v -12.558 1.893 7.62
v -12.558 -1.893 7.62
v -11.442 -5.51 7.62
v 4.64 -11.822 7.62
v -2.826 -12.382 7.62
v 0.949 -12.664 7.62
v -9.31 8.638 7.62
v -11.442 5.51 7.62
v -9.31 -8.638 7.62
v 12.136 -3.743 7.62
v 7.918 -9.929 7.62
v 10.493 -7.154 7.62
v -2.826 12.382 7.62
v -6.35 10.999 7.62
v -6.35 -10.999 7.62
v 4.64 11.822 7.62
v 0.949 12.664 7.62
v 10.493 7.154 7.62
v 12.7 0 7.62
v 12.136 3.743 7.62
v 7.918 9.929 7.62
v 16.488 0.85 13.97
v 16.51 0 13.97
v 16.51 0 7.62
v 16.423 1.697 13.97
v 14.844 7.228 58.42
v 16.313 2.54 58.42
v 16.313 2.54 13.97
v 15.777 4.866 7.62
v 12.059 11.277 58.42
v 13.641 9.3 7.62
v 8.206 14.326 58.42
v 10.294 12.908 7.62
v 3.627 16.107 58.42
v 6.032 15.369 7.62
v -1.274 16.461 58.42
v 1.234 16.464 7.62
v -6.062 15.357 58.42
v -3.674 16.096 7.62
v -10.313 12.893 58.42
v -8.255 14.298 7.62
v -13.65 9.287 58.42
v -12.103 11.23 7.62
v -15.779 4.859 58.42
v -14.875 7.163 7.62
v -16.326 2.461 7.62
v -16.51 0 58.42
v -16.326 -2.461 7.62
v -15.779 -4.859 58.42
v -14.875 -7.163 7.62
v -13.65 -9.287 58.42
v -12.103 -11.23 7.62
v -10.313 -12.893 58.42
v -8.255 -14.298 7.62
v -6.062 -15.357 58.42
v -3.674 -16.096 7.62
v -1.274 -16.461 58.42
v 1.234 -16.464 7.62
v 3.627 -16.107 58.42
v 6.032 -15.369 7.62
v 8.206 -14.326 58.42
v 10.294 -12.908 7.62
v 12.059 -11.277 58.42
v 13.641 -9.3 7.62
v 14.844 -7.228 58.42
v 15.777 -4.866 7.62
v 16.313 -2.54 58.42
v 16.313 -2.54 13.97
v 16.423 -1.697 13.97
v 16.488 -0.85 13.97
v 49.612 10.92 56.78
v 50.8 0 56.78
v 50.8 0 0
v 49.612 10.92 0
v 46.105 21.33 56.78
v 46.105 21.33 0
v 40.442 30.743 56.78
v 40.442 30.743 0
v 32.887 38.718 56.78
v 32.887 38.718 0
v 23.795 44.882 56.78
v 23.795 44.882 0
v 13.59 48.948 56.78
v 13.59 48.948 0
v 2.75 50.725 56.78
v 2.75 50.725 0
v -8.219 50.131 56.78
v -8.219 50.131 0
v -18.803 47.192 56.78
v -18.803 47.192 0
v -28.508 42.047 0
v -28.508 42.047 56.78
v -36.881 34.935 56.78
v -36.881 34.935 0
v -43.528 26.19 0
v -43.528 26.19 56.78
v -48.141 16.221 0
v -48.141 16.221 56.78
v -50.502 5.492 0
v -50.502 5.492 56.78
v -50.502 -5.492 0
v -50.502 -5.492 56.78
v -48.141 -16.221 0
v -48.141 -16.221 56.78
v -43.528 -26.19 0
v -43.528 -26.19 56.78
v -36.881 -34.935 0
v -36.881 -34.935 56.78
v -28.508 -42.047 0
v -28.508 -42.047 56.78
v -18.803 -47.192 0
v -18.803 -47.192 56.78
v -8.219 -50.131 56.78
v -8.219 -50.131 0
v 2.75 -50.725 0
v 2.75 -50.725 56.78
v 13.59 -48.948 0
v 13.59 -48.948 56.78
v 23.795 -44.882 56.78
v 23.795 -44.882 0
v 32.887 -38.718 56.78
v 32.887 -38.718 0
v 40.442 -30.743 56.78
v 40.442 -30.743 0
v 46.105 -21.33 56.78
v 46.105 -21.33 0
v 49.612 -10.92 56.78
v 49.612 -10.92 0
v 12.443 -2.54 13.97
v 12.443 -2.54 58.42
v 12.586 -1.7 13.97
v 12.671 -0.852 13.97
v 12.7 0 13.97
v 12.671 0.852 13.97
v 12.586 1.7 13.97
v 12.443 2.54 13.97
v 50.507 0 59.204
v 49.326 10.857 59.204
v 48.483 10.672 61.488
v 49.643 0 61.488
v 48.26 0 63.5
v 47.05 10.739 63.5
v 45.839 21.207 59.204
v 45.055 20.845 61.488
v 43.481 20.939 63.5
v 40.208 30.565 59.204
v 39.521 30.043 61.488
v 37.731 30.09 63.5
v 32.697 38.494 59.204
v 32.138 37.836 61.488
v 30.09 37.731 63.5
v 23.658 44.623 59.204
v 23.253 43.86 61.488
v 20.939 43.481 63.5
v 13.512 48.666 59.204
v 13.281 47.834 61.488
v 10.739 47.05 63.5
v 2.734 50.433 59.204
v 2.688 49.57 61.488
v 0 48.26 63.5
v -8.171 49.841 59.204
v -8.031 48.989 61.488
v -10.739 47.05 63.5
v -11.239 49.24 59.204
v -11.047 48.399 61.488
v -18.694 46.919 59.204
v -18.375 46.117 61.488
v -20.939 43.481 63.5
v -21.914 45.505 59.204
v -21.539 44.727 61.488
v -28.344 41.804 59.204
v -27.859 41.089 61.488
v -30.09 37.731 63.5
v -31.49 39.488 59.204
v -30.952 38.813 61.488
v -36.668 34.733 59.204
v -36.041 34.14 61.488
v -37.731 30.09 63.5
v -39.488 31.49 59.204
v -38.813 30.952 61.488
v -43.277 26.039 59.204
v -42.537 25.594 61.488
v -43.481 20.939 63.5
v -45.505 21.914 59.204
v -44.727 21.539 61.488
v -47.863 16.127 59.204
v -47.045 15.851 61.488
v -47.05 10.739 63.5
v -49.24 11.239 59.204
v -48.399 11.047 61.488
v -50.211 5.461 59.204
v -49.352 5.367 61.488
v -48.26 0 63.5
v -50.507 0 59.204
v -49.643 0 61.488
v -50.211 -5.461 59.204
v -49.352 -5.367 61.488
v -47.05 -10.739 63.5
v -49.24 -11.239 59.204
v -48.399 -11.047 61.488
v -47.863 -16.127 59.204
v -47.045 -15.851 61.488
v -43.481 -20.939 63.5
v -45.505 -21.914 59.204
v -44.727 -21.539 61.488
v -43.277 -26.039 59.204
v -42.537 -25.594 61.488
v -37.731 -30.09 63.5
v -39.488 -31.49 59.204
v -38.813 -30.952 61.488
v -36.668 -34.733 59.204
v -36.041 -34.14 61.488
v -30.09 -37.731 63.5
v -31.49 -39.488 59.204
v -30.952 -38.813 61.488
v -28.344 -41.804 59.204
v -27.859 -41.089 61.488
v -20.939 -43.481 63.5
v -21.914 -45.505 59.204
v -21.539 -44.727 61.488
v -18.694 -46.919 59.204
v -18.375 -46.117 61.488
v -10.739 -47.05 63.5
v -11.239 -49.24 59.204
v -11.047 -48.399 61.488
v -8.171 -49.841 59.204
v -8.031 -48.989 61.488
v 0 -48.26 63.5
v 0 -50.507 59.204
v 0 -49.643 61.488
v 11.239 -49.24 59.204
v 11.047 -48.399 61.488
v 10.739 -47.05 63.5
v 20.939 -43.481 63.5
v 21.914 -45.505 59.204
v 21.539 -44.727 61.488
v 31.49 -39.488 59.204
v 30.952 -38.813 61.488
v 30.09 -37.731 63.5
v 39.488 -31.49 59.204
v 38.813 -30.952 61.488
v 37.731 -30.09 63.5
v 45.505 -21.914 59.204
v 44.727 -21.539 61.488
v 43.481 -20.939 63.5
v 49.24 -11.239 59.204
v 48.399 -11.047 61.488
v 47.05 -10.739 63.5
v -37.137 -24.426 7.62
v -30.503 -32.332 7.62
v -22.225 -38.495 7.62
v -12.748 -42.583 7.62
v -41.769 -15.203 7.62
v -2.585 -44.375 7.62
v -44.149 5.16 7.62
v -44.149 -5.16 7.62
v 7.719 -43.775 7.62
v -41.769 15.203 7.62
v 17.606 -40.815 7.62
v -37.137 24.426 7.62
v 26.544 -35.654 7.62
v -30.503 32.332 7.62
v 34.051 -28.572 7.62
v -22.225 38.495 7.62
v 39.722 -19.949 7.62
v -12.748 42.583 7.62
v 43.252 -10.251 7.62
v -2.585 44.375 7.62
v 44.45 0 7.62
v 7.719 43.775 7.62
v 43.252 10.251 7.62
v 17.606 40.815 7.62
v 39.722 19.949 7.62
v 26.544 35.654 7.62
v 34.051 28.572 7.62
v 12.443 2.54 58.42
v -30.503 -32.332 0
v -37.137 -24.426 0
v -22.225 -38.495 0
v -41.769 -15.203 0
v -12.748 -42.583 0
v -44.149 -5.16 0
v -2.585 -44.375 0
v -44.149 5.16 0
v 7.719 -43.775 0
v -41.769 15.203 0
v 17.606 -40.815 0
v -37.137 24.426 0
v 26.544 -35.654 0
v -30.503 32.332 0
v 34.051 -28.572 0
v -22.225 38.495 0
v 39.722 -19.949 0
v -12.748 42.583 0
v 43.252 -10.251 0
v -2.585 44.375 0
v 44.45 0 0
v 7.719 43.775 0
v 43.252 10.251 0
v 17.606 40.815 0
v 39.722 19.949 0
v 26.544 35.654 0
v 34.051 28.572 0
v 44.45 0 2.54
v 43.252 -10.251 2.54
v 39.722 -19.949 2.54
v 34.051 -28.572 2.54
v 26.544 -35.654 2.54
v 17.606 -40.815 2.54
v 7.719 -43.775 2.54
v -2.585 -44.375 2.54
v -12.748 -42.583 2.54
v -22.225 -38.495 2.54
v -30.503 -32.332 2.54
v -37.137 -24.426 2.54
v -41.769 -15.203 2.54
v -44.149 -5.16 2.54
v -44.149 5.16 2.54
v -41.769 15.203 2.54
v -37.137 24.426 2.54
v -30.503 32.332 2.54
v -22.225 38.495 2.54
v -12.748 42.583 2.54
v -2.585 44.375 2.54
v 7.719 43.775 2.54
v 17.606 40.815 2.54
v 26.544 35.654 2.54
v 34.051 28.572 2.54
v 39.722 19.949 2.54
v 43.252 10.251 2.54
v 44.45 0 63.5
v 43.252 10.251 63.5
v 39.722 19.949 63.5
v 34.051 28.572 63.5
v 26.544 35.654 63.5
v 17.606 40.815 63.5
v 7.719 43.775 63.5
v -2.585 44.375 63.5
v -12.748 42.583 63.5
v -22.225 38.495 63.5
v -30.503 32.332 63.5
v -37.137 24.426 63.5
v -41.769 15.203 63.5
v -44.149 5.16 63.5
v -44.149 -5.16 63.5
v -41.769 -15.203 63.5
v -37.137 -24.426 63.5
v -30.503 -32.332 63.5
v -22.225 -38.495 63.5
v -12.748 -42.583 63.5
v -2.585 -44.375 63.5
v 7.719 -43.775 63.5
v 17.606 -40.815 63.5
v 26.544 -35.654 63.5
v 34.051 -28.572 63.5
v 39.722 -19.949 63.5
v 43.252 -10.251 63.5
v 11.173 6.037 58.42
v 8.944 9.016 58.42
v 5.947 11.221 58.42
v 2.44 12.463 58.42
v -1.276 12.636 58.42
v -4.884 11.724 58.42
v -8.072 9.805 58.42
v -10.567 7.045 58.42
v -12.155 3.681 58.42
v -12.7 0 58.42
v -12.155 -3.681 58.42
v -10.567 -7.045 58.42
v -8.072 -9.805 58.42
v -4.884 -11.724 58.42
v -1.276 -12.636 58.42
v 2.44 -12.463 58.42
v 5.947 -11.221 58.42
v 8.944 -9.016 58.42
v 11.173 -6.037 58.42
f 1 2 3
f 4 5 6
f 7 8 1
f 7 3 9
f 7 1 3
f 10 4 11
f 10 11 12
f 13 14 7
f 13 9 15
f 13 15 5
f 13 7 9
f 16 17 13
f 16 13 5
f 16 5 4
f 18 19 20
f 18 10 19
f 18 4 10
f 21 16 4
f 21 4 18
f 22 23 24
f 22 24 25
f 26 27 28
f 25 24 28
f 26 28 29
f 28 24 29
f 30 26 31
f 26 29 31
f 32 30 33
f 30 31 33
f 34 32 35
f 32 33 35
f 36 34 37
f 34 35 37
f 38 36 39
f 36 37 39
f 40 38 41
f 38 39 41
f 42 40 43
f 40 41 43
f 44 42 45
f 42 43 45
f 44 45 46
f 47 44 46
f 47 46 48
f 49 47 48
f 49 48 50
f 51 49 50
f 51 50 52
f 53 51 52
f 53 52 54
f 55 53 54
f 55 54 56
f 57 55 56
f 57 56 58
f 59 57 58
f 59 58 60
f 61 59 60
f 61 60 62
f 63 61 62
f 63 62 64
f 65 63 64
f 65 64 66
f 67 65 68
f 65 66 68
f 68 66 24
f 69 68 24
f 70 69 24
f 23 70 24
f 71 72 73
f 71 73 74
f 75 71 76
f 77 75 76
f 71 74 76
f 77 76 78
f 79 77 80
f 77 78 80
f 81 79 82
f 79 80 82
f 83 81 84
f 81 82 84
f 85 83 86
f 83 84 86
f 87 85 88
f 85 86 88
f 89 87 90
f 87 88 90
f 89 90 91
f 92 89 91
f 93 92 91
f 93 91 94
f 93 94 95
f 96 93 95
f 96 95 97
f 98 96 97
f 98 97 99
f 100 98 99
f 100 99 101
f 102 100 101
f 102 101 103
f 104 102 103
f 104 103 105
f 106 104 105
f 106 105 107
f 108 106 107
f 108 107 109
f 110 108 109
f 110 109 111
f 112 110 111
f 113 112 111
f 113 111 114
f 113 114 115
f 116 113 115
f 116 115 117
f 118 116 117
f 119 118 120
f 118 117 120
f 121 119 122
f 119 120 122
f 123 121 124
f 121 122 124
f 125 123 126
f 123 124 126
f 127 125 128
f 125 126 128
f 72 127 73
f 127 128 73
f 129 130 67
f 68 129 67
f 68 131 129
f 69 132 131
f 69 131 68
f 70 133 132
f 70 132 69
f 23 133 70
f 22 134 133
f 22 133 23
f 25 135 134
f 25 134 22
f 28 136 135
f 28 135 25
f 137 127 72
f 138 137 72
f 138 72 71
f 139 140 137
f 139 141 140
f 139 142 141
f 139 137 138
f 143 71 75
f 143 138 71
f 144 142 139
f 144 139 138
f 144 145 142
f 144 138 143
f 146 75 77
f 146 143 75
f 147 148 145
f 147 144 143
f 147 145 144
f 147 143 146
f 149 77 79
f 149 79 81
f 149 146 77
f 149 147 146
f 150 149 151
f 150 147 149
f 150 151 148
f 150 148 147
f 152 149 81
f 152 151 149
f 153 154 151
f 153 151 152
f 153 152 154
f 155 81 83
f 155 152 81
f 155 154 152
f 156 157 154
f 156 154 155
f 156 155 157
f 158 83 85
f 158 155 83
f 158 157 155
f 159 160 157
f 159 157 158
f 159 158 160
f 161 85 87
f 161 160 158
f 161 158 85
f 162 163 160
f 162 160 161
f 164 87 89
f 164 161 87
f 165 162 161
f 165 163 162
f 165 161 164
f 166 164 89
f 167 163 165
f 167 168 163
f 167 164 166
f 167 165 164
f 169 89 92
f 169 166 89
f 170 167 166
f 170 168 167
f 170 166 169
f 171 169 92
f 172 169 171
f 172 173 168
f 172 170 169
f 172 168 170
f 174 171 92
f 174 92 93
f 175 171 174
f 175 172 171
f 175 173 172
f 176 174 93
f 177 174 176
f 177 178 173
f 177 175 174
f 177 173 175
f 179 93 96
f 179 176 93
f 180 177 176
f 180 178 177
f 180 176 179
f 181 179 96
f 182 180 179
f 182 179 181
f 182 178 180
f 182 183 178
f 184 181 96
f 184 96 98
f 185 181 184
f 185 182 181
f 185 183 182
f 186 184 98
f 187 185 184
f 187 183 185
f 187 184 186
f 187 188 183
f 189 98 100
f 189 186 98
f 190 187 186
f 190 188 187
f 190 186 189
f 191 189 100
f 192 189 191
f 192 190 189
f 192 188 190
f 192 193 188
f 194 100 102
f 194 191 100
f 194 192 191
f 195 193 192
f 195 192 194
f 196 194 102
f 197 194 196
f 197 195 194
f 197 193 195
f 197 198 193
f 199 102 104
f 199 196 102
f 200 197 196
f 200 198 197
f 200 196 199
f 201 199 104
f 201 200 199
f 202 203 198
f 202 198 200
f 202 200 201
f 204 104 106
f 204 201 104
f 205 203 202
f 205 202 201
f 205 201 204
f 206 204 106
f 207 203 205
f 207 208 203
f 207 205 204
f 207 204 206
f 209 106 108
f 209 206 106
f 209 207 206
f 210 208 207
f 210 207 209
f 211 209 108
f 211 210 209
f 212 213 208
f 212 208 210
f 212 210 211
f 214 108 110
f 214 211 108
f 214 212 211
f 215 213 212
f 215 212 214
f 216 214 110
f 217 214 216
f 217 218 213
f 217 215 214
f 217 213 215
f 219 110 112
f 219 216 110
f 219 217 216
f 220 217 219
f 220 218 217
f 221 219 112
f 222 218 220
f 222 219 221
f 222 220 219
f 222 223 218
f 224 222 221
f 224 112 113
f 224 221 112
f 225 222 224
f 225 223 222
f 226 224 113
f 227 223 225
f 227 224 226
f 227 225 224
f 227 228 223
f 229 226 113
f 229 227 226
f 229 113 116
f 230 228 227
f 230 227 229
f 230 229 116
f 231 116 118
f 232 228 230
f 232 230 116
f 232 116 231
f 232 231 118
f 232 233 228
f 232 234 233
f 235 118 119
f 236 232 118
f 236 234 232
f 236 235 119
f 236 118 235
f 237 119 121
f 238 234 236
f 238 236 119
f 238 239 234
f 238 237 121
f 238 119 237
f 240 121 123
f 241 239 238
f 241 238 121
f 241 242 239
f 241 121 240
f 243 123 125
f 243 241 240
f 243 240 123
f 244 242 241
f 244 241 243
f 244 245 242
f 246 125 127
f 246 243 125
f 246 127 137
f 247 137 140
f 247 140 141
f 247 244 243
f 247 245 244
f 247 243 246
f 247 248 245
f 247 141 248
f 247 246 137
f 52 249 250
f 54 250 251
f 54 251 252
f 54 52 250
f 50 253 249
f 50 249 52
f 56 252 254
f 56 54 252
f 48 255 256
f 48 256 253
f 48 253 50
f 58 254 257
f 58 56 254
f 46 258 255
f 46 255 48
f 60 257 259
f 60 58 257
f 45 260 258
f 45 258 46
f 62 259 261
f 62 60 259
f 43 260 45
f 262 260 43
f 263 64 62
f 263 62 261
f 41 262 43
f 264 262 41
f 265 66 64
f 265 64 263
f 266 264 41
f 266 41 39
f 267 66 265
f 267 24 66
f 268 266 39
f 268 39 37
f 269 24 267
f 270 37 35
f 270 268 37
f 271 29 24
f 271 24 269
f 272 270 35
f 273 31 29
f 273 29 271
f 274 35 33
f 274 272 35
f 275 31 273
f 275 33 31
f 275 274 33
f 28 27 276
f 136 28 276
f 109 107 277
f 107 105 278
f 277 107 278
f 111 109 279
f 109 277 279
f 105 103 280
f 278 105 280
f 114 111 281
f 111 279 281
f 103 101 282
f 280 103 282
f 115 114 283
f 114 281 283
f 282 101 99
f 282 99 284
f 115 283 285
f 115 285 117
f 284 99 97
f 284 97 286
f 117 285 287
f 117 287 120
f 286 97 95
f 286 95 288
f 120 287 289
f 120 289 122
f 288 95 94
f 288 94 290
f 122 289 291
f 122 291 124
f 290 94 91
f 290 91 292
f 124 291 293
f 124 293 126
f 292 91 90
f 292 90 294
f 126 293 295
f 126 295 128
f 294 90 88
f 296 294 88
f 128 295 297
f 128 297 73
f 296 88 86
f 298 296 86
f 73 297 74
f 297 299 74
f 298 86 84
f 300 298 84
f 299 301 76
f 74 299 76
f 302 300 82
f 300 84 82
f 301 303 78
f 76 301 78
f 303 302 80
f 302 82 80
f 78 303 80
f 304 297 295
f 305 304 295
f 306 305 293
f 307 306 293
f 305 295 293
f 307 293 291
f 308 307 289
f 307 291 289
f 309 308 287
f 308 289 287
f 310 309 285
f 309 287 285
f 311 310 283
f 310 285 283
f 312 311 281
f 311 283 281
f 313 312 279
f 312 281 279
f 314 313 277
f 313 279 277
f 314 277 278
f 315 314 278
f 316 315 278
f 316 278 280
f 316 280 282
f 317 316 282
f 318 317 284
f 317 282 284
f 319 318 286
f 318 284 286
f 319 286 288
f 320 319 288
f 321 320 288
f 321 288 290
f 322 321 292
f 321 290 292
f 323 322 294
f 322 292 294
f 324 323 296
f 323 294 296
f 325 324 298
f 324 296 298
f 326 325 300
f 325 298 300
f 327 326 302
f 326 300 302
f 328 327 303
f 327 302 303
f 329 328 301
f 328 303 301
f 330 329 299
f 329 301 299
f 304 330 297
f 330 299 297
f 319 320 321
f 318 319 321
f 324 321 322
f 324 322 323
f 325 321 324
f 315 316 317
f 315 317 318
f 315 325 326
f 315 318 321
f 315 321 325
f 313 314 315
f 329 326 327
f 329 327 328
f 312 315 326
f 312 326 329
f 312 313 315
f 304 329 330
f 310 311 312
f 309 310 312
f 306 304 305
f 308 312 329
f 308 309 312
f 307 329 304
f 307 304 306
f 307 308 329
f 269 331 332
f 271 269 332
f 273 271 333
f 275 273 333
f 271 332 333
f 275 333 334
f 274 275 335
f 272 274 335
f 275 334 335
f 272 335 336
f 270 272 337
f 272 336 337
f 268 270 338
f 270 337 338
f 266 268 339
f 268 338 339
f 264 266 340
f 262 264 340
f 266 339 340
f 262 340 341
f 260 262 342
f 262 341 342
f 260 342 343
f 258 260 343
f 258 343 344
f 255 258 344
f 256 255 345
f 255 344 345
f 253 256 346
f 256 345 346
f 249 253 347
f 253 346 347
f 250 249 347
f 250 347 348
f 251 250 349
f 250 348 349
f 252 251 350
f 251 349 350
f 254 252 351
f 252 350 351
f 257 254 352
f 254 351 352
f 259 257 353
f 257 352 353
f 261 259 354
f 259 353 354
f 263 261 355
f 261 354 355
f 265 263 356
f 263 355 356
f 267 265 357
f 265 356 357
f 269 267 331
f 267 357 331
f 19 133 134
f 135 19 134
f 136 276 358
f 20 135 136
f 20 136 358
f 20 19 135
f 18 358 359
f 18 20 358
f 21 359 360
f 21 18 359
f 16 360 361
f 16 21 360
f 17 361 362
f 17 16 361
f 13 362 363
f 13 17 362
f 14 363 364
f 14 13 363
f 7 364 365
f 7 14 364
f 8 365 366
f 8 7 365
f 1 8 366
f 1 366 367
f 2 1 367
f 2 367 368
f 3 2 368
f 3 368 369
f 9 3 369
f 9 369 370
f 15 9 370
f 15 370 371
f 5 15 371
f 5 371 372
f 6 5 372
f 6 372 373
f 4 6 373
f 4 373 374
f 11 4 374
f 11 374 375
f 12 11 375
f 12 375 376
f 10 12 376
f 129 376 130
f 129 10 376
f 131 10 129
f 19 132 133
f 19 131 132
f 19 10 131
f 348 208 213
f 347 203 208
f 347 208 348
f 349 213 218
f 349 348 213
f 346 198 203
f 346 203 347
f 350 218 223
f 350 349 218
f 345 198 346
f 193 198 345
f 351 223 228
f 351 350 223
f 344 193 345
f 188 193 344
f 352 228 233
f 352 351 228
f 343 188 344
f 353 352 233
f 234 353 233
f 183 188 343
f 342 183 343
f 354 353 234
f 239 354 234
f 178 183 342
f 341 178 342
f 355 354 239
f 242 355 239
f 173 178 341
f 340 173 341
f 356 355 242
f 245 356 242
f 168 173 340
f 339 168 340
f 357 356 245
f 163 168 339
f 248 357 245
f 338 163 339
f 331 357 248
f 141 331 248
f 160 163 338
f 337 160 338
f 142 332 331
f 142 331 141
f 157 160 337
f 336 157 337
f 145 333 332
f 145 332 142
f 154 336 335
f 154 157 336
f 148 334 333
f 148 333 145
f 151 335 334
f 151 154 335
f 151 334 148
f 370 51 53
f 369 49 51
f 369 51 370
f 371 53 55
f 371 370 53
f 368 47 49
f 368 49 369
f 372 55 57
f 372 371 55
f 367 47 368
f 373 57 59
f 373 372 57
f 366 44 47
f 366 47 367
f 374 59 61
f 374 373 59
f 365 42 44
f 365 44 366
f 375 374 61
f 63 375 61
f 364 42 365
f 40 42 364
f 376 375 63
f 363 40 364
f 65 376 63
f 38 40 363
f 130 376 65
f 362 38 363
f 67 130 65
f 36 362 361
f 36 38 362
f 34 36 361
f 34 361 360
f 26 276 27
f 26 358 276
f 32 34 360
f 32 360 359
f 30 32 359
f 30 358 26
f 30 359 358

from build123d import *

# Parameters (mm, degrees)
F0_R      = 50.8
F1_DEPTH  = 63.5
F2_R      = 44.45
F3_DEPTH  = 55.88
F4_R      = 44.45
F5_DEPTH  = 2.54
F6_SIZE   = 2.54
F8_R      = 16.51
F8_R_2    = 12.7
F9_DEPTH  = 50.8
F11_DEPTH = 44.45


# Not quite as in the source:
# - a fillet or chamfer that OpenCascade refuses, or shapes differently, is made with other operations: its cross-section is extruded or revolved along the edge and cut away or added


with BuildPart() as f1:
    # F0 (on Top) → F1 (new body)
    with BuildSketch(Plane.XY):
        Circle(F0_R)
    extrude(amount=F1_DEPTH)

    # F2 (on face) → F3 (cut)
    with BuildSketch(Plane.XY.offset(63.5)):
        Circle(F2_R)
    extrude(amount=-F3_DEPTH, mode=Mode.SUBTRACT)

    # F4 (on face) → F5 (cut)
    with BuildSketch(Plane(origin=(0, 0, 0), x_dir=(1, 0, 0), z_dir=(0, 0, -1))):
        Circle(F4_R)
    extrude(amount=-F5_DEPTH, mode=Mode.SUBTRACT)

    # F6
    f6_edges = [f1.edges().sort_by_distance(p)[0] for p in [
        (-50.8, 0, 63.5),
    ]]
    chamfer(f6_edges, length=F6_SIZE)

    # F7: fillet of radius 10.16 on 1 edges, made by hand

    # F7_s1 → F7_t2 (revolve, cut)
    with BuildSketch(Plane.XZ):
        with BuildLine():
            ThreePointArc((50.8, 56.7797916699), (50.1438097624, 60.3718941183), (48.26, 63.5))
            Line((48.26, 63.5), (50.8, 60.96))
            Line((50.8, 60.96), (50.8, 56.7797916699))
        make_face()
    revolve(axis=Axis((0, 0, 60.96), (0, 0, 1)), mode=Mode.SUBTRACT)

    # F8 (on face) → F9 (join)
    with BuildSketch(Plane.XY.offset(7.62)):
        Circle(F8_R)
        Circle(F8_R_2, mode=Mode.SUBTRACT)
    extrude(amount=F9_DEPTH)

    # F10 (on face) → F11 (cut)
    with BuildSketch(Plane.XY.offset(58.42)):
        with BuildLine():
            ThreePointArc((12.4434078933, 2.54), (12.6356891432, 1.2764638175), (12.7, 0))
            Line((12.7, 0), (14.605, 0))
            Line((14.605, 0), (14.605, 2.54))
            Line((14.605, 2.54), (12.4434078933, 2.54))
        make_face()
        with BuildLine():
            Line((14.605, 2.54), (14.605, 0))
            Line((14.605, 0), (16.51, 0))
            ThreePointArc((16.51, 0), (16.4607879997, 1.2737968559), (16.3134453749, 2.54))
            Line((16.3134453749, 2.54), (14.605, 2.54))
        make_face()
        with BuildLine():
            Line((16.51, 0), (14.605, 0))
            Line((14.605, 0), (14.605, -2.54))
            Line((14.605, -2.54), (16.3134453749, -2.54))
            ThreePointArc((16.3134453749, -2.54), (16.4607879997, -1.2737968559), (16.51, 0))
        make_face()
        with BuildLine():
            Line((14.605, 0), (12.7, 0))
            ThreePointArc((12.7, 0), (12.6356891432, -1.2764638175), (12.4434078933, -2.54))
            Line((12.4434078933, -2.54), (14.605, -2.54))
            Line((14.605, -2.54), (14.605, 0))
        make_face()
    extrude(amount=-F11_DEPTH, mode=Mode.SUBTRACT)


solid = f1.part
